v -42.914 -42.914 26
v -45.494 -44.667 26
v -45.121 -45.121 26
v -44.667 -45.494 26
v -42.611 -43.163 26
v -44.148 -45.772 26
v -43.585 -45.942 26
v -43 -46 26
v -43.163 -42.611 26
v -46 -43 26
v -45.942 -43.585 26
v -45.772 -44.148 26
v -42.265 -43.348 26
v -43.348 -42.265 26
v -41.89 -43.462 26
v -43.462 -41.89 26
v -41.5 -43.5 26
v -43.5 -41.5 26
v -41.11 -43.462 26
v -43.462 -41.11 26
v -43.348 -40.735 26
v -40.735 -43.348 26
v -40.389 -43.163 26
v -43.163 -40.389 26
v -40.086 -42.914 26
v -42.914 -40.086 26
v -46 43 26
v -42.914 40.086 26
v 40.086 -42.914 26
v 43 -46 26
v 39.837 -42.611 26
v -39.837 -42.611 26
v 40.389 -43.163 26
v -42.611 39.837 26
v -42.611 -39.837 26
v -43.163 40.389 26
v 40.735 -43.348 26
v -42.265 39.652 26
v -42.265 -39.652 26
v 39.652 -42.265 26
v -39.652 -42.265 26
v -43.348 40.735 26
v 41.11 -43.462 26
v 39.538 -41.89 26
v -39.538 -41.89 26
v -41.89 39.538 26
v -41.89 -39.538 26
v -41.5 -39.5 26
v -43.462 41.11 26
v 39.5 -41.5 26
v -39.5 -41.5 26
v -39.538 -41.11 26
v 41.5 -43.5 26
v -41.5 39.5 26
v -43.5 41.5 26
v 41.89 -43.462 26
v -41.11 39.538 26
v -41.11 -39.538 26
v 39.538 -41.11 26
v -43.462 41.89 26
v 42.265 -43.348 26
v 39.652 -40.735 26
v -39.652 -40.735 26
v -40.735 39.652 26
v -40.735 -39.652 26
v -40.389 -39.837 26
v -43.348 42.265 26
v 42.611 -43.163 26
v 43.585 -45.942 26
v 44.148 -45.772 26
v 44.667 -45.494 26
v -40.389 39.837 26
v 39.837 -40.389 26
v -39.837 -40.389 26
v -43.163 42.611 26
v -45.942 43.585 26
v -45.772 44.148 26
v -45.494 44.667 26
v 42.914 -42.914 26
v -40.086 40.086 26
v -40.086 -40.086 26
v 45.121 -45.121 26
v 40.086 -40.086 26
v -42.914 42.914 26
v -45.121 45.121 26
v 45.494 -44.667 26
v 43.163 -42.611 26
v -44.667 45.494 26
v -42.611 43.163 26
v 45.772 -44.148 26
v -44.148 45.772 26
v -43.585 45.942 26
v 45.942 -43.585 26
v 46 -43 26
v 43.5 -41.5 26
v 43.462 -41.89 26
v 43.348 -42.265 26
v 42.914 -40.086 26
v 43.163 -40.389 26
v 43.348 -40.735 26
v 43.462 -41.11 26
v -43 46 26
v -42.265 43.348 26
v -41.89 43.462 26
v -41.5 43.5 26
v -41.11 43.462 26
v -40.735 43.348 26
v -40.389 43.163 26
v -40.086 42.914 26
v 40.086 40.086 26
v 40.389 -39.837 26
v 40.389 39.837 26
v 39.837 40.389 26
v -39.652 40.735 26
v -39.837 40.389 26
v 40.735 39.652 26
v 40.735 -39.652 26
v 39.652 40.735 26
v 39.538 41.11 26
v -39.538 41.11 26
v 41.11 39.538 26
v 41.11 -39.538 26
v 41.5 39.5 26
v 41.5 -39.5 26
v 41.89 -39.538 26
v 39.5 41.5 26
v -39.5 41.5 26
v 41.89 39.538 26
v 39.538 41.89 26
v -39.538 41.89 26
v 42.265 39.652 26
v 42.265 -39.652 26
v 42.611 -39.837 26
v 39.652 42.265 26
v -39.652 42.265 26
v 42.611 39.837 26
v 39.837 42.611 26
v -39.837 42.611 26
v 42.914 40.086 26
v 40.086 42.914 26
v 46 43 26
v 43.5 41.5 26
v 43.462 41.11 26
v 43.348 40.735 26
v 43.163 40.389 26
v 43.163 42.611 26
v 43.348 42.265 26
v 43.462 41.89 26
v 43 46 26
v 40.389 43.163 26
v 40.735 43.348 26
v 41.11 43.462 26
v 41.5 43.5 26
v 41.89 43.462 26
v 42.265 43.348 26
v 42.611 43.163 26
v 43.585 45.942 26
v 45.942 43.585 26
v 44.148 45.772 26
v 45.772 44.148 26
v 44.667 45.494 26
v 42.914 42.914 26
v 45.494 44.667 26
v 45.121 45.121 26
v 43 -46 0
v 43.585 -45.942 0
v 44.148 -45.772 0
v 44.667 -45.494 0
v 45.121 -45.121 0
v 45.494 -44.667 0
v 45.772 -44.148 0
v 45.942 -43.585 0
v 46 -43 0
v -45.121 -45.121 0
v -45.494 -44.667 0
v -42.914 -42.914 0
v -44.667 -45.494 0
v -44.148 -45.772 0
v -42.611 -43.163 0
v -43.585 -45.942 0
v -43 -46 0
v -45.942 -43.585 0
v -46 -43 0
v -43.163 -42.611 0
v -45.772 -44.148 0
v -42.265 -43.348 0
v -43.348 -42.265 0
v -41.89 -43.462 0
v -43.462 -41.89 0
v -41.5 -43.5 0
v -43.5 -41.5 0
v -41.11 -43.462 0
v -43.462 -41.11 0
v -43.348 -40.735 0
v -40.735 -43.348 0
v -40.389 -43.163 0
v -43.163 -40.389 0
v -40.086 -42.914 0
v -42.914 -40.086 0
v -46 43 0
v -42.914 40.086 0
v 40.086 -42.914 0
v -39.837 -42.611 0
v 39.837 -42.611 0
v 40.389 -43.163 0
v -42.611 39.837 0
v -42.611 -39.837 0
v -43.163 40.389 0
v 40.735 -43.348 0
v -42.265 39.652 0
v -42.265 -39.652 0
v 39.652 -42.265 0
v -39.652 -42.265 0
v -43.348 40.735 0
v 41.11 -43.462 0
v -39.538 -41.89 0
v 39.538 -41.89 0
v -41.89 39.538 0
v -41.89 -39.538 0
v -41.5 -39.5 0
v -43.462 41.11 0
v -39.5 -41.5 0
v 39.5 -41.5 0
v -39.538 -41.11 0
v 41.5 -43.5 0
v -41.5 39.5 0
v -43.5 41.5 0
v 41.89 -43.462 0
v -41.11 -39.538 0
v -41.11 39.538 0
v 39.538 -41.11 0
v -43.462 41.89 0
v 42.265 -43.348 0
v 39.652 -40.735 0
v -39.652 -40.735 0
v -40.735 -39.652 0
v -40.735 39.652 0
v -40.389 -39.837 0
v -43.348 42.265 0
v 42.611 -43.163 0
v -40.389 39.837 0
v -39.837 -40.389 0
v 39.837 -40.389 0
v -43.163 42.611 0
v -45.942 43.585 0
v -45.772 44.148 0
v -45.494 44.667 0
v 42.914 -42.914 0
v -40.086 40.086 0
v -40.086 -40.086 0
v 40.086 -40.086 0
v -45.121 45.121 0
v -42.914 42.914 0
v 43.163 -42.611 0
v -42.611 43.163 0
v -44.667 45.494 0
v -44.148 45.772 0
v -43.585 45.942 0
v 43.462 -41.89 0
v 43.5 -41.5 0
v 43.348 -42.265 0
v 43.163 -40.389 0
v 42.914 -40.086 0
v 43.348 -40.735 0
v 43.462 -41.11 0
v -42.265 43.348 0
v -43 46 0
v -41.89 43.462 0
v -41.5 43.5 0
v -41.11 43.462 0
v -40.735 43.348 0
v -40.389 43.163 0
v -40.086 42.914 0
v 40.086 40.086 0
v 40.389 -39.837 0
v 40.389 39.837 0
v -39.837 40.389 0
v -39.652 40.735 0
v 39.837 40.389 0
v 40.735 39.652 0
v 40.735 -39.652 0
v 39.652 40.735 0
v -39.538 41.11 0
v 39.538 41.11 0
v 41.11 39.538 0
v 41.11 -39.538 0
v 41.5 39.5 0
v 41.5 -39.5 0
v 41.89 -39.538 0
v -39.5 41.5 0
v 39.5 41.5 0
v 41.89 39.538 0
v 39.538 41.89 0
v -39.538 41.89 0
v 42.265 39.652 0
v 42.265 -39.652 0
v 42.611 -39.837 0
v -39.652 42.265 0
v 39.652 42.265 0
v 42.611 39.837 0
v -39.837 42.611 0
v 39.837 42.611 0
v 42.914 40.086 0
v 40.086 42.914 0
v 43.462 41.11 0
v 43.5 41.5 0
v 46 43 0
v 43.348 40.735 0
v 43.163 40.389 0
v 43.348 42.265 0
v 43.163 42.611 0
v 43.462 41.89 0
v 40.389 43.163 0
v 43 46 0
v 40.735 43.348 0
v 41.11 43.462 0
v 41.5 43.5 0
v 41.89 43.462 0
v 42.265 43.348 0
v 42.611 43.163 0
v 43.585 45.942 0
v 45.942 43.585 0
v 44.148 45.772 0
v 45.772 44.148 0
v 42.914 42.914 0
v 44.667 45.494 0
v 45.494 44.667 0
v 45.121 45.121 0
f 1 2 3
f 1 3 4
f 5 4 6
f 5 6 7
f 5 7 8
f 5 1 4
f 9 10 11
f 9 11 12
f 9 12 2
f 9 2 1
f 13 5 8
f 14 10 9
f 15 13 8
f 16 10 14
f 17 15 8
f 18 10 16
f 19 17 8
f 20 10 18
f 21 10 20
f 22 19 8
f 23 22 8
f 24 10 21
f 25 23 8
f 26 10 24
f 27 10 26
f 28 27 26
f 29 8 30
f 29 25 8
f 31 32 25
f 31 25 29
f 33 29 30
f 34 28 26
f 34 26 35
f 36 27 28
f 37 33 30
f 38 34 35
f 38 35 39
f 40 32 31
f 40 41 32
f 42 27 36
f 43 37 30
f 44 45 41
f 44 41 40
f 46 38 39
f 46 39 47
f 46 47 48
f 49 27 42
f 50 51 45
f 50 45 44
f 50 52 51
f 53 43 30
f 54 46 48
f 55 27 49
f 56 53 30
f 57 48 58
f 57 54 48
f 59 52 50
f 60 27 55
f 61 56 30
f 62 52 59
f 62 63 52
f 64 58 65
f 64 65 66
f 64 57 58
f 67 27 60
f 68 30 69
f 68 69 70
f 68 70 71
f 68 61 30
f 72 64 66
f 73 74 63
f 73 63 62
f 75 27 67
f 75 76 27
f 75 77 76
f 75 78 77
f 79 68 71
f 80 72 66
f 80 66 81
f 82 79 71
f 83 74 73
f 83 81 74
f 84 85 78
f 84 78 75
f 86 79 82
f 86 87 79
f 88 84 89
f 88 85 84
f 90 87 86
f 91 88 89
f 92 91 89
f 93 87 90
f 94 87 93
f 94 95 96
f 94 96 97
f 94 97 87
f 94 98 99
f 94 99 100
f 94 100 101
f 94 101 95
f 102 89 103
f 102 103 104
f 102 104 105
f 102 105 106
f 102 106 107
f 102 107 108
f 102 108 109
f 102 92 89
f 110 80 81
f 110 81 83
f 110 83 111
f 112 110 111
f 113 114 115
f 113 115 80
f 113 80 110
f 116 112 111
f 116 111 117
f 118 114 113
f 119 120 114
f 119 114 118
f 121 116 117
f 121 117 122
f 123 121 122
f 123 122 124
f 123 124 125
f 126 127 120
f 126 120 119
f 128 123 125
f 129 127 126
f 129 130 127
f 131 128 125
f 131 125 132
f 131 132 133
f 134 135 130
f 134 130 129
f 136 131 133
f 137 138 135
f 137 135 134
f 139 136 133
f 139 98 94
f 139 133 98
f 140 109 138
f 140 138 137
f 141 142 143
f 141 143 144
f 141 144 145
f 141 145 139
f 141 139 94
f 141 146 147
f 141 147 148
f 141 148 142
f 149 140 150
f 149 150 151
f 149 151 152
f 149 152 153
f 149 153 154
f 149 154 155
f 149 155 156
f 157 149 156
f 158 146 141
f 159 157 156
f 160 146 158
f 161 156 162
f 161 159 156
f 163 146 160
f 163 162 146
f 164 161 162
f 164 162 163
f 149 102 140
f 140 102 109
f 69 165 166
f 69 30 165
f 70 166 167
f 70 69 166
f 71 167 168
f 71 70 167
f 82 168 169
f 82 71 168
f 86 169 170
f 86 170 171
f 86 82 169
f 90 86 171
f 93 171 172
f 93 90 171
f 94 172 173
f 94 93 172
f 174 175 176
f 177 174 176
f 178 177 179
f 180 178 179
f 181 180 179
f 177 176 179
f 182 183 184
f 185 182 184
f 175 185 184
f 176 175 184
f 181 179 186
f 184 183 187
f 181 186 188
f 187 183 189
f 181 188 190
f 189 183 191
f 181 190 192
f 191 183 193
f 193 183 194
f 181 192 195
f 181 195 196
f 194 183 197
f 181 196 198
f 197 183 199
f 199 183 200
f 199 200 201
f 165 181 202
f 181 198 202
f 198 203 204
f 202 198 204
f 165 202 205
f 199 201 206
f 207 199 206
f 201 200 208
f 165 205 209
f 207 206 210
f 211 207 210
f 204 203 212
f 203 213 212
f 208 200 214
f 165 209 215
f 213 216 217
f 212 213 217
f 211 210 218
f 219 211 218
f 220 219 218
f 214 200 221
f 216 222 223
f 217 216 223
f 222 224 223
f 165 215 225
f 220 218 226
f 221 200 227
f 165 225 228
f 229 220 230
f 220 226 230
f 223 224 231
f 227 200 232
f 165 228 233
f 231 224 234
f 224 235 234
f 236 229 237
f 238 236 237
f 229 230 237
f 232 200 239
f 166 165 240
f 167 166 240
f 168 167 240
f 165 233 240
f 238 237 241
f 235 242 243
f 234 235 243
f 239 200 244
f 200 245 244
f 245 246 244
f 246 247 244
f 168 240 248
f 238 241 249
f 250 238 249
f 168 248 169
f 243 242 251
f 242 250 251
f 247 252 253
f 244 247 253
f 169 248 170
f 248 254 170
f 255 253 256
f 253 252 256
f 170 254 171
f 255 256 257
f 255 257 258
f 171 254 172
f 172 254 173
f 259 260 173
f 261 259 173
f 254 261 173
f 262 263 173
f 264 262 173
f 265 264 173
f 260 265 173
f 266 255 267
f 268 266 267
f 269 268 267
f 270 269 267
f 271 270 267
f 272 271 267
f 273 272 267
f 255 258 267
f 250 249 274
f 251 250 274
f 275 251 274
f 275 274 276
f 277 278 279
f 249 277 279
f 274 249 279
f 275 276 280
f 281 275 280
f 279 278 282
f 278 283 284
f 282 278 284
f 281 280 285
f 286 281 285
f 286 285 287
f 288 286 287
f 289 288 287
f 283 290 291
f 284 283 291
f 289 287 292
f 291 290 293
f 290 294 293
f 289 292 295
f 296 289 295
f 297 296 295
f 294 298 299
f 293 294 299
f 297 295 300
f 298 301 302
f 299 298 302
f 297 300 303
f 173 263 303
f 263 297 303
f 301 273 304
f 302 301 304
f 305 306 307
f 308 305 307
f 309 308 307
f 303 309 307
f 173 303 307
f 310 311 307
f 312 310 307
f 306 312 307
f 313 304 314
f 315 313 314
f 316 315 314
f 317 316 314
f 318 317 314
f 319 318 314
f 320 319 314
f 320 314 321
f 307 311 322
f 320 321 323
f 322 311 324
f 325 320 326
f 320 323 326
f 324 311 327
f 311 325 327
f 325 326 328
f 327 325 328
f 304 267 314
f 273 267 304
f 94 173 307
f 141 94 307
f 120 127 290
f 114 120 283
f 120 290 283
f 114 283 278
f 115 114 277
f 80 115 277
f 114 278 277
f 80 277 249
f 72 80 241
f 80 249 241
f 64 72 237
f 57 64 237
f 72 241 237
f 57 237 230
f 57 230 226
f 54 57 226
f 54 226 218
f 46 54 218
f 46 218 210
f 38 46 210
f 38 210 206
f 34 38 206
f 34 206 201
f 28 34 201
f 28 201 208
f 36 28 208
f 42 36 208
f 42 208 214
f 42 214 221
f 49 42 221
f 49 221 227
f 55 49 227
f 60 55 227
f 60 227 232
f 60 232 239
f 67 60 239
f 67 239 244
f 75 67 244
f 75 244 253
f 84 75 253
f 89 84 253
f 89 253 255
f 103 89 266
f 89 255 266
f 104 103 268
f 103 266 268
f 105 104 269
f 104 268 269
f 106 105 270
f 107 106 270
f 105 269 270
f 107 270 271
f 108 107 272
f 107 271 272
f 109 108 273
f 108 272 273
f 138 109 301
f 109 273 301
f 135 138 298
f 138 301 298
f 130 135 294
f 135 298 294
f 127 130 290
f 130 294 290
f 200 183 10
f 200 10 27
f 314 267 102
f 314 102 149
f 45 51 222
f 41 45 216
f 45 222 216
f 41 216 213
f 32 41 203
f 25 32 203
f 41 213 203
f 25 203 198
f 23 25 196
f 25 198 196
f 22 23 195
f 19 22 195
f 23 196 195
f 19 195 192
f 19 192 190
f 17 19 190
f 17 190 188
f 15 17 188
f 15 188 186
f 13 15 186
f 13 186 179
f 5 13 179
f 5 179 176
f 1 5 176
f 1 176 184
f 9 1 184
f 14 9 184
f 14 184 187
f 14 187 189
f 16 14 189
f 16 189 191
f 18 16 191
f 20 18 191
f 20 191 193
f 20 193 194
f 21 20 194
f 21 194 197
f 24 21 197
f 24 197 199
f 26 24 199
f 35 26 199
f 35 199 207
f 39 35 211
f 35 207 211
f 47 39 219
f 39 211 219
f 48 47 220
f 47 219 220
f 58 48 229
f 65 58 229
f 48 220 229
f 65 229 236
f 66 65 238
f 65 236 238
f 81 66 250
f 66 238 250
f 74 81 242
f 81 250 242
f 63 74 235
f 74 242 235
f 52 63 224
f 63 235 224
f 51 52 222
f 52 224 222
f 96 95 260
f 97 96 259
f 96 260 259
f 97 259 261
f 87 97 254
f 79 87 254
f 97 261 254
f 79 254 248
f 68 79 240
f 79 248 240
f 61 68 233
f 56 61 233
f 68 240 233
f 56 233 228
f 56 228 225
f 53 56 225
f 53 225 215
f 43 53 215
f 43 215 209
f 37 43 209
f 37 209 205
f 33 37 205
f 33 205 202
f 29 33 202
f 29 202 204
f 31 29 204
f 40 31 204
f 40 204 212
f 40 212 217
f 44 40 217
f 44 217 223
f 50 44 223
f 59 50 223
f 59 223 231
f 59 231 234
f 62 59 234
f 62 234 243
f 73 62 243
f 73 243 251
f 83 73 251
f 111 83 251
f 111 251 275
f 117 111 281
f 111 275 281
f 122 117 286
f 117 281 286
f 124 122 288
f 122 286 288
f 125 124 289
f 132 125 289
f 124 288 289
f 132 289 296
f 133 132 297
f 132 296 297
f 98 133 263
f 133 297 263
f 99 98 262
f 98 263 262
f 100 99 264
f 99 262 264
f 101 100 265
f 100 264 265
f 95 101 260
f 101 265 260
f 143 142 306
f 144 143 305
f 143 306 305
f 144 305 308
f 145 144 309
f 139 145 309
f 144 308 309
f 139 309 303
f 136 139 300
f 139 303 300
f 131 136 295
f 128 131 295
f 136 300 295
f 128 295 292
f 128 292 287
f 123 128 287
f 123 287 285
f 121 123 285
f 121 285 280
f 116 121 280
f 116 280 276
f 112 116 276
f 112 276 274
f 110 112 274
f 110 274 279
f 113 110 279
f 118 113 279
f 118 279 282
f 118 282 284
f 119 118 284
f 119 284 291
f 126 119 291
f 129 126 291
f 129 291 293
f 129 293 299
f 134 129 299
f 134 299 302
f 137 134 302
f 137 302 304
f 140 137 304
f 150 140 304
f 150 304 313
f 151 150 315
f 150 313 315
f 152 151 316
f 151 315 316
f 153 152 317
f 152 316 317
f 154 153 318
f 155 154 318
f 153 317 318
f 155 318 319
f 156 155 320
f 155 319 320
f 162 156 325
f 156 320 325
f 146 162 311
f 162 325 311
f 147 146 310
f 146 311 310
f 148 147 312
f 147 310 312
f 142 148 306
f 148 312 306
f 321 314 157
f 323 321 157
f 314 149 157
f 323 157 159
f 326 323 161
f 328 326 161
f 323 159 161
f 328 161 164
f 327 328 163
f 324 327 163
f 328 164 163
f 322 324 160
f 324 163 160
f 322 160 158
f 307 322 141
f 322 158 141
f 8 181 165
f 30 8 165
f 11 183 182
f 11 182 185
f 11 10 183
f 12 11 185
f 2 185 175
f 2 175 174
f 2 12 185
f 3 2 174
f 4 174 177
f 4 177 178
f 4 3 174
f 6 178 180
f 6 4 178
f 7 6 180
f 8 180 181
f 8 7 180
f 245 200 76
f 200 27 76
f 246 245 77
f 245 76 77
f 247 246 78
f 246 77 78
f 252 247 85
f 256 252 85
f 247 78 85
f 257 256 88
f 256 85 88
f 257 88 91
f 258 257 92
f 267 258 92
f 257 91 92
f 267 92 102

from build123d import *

# Parameters (mm, degrees)
SKETCH003_W       = 92
SKETCH003_H       = 92
PAD003_DEPTH      = 26
SKETCH004_R       = 2
POCKET_DEPTH      = 26.001
POCKET_DEPTH_BACK = 0.001
FILLET_R          = 3


with BuildPart() as part:
    # Sketch003 → Pad003 (new body)
    with BuildSketch(Plane.XY):
        Rectangle(SKETCH003_W, SKETCH003_H)
    extrude(amount=PAD003_DEPTH)

    # Sketch004 (on Face5 of Pad003) → Pocket (cut, two sides)
    with BuildSketch(Plane(origin=(0, 0, 0), x_dir=(1, 0, 0), z_dir=(0, 0, -1))) as pocket_sk:
        with Locations((41.5, 41.5)):
            Circle(SKETCH004_R)
        with Locations((-41.5, 41.5)):
            Circle(SKETCH004_R)
        with Locations((41.5, -41.5)):
            Circle(SKETCH004_R)
        with Locations((-41.5, -41.5)):
            Circle(SKETCH004_R)
    extrude(amount=-POCKET_DEPTH, mode=Mode.SUBTRACT)
    extrude(pocket_sk.sketch, amount=POCKET_DEPTH_BACK, mode=Mode.SUBTRACT)

    # Fillet
    fillet_edges = [part.edges().sort_by_distance(p)[0] for p in [
        (-46, 46, 13),
        (-46, -46, 13),
        (46, -46, 13),
        (46, 46, 13),
    ]]
    fillet(fillet_edges, radius=FILLET_R)


solid = part.part
